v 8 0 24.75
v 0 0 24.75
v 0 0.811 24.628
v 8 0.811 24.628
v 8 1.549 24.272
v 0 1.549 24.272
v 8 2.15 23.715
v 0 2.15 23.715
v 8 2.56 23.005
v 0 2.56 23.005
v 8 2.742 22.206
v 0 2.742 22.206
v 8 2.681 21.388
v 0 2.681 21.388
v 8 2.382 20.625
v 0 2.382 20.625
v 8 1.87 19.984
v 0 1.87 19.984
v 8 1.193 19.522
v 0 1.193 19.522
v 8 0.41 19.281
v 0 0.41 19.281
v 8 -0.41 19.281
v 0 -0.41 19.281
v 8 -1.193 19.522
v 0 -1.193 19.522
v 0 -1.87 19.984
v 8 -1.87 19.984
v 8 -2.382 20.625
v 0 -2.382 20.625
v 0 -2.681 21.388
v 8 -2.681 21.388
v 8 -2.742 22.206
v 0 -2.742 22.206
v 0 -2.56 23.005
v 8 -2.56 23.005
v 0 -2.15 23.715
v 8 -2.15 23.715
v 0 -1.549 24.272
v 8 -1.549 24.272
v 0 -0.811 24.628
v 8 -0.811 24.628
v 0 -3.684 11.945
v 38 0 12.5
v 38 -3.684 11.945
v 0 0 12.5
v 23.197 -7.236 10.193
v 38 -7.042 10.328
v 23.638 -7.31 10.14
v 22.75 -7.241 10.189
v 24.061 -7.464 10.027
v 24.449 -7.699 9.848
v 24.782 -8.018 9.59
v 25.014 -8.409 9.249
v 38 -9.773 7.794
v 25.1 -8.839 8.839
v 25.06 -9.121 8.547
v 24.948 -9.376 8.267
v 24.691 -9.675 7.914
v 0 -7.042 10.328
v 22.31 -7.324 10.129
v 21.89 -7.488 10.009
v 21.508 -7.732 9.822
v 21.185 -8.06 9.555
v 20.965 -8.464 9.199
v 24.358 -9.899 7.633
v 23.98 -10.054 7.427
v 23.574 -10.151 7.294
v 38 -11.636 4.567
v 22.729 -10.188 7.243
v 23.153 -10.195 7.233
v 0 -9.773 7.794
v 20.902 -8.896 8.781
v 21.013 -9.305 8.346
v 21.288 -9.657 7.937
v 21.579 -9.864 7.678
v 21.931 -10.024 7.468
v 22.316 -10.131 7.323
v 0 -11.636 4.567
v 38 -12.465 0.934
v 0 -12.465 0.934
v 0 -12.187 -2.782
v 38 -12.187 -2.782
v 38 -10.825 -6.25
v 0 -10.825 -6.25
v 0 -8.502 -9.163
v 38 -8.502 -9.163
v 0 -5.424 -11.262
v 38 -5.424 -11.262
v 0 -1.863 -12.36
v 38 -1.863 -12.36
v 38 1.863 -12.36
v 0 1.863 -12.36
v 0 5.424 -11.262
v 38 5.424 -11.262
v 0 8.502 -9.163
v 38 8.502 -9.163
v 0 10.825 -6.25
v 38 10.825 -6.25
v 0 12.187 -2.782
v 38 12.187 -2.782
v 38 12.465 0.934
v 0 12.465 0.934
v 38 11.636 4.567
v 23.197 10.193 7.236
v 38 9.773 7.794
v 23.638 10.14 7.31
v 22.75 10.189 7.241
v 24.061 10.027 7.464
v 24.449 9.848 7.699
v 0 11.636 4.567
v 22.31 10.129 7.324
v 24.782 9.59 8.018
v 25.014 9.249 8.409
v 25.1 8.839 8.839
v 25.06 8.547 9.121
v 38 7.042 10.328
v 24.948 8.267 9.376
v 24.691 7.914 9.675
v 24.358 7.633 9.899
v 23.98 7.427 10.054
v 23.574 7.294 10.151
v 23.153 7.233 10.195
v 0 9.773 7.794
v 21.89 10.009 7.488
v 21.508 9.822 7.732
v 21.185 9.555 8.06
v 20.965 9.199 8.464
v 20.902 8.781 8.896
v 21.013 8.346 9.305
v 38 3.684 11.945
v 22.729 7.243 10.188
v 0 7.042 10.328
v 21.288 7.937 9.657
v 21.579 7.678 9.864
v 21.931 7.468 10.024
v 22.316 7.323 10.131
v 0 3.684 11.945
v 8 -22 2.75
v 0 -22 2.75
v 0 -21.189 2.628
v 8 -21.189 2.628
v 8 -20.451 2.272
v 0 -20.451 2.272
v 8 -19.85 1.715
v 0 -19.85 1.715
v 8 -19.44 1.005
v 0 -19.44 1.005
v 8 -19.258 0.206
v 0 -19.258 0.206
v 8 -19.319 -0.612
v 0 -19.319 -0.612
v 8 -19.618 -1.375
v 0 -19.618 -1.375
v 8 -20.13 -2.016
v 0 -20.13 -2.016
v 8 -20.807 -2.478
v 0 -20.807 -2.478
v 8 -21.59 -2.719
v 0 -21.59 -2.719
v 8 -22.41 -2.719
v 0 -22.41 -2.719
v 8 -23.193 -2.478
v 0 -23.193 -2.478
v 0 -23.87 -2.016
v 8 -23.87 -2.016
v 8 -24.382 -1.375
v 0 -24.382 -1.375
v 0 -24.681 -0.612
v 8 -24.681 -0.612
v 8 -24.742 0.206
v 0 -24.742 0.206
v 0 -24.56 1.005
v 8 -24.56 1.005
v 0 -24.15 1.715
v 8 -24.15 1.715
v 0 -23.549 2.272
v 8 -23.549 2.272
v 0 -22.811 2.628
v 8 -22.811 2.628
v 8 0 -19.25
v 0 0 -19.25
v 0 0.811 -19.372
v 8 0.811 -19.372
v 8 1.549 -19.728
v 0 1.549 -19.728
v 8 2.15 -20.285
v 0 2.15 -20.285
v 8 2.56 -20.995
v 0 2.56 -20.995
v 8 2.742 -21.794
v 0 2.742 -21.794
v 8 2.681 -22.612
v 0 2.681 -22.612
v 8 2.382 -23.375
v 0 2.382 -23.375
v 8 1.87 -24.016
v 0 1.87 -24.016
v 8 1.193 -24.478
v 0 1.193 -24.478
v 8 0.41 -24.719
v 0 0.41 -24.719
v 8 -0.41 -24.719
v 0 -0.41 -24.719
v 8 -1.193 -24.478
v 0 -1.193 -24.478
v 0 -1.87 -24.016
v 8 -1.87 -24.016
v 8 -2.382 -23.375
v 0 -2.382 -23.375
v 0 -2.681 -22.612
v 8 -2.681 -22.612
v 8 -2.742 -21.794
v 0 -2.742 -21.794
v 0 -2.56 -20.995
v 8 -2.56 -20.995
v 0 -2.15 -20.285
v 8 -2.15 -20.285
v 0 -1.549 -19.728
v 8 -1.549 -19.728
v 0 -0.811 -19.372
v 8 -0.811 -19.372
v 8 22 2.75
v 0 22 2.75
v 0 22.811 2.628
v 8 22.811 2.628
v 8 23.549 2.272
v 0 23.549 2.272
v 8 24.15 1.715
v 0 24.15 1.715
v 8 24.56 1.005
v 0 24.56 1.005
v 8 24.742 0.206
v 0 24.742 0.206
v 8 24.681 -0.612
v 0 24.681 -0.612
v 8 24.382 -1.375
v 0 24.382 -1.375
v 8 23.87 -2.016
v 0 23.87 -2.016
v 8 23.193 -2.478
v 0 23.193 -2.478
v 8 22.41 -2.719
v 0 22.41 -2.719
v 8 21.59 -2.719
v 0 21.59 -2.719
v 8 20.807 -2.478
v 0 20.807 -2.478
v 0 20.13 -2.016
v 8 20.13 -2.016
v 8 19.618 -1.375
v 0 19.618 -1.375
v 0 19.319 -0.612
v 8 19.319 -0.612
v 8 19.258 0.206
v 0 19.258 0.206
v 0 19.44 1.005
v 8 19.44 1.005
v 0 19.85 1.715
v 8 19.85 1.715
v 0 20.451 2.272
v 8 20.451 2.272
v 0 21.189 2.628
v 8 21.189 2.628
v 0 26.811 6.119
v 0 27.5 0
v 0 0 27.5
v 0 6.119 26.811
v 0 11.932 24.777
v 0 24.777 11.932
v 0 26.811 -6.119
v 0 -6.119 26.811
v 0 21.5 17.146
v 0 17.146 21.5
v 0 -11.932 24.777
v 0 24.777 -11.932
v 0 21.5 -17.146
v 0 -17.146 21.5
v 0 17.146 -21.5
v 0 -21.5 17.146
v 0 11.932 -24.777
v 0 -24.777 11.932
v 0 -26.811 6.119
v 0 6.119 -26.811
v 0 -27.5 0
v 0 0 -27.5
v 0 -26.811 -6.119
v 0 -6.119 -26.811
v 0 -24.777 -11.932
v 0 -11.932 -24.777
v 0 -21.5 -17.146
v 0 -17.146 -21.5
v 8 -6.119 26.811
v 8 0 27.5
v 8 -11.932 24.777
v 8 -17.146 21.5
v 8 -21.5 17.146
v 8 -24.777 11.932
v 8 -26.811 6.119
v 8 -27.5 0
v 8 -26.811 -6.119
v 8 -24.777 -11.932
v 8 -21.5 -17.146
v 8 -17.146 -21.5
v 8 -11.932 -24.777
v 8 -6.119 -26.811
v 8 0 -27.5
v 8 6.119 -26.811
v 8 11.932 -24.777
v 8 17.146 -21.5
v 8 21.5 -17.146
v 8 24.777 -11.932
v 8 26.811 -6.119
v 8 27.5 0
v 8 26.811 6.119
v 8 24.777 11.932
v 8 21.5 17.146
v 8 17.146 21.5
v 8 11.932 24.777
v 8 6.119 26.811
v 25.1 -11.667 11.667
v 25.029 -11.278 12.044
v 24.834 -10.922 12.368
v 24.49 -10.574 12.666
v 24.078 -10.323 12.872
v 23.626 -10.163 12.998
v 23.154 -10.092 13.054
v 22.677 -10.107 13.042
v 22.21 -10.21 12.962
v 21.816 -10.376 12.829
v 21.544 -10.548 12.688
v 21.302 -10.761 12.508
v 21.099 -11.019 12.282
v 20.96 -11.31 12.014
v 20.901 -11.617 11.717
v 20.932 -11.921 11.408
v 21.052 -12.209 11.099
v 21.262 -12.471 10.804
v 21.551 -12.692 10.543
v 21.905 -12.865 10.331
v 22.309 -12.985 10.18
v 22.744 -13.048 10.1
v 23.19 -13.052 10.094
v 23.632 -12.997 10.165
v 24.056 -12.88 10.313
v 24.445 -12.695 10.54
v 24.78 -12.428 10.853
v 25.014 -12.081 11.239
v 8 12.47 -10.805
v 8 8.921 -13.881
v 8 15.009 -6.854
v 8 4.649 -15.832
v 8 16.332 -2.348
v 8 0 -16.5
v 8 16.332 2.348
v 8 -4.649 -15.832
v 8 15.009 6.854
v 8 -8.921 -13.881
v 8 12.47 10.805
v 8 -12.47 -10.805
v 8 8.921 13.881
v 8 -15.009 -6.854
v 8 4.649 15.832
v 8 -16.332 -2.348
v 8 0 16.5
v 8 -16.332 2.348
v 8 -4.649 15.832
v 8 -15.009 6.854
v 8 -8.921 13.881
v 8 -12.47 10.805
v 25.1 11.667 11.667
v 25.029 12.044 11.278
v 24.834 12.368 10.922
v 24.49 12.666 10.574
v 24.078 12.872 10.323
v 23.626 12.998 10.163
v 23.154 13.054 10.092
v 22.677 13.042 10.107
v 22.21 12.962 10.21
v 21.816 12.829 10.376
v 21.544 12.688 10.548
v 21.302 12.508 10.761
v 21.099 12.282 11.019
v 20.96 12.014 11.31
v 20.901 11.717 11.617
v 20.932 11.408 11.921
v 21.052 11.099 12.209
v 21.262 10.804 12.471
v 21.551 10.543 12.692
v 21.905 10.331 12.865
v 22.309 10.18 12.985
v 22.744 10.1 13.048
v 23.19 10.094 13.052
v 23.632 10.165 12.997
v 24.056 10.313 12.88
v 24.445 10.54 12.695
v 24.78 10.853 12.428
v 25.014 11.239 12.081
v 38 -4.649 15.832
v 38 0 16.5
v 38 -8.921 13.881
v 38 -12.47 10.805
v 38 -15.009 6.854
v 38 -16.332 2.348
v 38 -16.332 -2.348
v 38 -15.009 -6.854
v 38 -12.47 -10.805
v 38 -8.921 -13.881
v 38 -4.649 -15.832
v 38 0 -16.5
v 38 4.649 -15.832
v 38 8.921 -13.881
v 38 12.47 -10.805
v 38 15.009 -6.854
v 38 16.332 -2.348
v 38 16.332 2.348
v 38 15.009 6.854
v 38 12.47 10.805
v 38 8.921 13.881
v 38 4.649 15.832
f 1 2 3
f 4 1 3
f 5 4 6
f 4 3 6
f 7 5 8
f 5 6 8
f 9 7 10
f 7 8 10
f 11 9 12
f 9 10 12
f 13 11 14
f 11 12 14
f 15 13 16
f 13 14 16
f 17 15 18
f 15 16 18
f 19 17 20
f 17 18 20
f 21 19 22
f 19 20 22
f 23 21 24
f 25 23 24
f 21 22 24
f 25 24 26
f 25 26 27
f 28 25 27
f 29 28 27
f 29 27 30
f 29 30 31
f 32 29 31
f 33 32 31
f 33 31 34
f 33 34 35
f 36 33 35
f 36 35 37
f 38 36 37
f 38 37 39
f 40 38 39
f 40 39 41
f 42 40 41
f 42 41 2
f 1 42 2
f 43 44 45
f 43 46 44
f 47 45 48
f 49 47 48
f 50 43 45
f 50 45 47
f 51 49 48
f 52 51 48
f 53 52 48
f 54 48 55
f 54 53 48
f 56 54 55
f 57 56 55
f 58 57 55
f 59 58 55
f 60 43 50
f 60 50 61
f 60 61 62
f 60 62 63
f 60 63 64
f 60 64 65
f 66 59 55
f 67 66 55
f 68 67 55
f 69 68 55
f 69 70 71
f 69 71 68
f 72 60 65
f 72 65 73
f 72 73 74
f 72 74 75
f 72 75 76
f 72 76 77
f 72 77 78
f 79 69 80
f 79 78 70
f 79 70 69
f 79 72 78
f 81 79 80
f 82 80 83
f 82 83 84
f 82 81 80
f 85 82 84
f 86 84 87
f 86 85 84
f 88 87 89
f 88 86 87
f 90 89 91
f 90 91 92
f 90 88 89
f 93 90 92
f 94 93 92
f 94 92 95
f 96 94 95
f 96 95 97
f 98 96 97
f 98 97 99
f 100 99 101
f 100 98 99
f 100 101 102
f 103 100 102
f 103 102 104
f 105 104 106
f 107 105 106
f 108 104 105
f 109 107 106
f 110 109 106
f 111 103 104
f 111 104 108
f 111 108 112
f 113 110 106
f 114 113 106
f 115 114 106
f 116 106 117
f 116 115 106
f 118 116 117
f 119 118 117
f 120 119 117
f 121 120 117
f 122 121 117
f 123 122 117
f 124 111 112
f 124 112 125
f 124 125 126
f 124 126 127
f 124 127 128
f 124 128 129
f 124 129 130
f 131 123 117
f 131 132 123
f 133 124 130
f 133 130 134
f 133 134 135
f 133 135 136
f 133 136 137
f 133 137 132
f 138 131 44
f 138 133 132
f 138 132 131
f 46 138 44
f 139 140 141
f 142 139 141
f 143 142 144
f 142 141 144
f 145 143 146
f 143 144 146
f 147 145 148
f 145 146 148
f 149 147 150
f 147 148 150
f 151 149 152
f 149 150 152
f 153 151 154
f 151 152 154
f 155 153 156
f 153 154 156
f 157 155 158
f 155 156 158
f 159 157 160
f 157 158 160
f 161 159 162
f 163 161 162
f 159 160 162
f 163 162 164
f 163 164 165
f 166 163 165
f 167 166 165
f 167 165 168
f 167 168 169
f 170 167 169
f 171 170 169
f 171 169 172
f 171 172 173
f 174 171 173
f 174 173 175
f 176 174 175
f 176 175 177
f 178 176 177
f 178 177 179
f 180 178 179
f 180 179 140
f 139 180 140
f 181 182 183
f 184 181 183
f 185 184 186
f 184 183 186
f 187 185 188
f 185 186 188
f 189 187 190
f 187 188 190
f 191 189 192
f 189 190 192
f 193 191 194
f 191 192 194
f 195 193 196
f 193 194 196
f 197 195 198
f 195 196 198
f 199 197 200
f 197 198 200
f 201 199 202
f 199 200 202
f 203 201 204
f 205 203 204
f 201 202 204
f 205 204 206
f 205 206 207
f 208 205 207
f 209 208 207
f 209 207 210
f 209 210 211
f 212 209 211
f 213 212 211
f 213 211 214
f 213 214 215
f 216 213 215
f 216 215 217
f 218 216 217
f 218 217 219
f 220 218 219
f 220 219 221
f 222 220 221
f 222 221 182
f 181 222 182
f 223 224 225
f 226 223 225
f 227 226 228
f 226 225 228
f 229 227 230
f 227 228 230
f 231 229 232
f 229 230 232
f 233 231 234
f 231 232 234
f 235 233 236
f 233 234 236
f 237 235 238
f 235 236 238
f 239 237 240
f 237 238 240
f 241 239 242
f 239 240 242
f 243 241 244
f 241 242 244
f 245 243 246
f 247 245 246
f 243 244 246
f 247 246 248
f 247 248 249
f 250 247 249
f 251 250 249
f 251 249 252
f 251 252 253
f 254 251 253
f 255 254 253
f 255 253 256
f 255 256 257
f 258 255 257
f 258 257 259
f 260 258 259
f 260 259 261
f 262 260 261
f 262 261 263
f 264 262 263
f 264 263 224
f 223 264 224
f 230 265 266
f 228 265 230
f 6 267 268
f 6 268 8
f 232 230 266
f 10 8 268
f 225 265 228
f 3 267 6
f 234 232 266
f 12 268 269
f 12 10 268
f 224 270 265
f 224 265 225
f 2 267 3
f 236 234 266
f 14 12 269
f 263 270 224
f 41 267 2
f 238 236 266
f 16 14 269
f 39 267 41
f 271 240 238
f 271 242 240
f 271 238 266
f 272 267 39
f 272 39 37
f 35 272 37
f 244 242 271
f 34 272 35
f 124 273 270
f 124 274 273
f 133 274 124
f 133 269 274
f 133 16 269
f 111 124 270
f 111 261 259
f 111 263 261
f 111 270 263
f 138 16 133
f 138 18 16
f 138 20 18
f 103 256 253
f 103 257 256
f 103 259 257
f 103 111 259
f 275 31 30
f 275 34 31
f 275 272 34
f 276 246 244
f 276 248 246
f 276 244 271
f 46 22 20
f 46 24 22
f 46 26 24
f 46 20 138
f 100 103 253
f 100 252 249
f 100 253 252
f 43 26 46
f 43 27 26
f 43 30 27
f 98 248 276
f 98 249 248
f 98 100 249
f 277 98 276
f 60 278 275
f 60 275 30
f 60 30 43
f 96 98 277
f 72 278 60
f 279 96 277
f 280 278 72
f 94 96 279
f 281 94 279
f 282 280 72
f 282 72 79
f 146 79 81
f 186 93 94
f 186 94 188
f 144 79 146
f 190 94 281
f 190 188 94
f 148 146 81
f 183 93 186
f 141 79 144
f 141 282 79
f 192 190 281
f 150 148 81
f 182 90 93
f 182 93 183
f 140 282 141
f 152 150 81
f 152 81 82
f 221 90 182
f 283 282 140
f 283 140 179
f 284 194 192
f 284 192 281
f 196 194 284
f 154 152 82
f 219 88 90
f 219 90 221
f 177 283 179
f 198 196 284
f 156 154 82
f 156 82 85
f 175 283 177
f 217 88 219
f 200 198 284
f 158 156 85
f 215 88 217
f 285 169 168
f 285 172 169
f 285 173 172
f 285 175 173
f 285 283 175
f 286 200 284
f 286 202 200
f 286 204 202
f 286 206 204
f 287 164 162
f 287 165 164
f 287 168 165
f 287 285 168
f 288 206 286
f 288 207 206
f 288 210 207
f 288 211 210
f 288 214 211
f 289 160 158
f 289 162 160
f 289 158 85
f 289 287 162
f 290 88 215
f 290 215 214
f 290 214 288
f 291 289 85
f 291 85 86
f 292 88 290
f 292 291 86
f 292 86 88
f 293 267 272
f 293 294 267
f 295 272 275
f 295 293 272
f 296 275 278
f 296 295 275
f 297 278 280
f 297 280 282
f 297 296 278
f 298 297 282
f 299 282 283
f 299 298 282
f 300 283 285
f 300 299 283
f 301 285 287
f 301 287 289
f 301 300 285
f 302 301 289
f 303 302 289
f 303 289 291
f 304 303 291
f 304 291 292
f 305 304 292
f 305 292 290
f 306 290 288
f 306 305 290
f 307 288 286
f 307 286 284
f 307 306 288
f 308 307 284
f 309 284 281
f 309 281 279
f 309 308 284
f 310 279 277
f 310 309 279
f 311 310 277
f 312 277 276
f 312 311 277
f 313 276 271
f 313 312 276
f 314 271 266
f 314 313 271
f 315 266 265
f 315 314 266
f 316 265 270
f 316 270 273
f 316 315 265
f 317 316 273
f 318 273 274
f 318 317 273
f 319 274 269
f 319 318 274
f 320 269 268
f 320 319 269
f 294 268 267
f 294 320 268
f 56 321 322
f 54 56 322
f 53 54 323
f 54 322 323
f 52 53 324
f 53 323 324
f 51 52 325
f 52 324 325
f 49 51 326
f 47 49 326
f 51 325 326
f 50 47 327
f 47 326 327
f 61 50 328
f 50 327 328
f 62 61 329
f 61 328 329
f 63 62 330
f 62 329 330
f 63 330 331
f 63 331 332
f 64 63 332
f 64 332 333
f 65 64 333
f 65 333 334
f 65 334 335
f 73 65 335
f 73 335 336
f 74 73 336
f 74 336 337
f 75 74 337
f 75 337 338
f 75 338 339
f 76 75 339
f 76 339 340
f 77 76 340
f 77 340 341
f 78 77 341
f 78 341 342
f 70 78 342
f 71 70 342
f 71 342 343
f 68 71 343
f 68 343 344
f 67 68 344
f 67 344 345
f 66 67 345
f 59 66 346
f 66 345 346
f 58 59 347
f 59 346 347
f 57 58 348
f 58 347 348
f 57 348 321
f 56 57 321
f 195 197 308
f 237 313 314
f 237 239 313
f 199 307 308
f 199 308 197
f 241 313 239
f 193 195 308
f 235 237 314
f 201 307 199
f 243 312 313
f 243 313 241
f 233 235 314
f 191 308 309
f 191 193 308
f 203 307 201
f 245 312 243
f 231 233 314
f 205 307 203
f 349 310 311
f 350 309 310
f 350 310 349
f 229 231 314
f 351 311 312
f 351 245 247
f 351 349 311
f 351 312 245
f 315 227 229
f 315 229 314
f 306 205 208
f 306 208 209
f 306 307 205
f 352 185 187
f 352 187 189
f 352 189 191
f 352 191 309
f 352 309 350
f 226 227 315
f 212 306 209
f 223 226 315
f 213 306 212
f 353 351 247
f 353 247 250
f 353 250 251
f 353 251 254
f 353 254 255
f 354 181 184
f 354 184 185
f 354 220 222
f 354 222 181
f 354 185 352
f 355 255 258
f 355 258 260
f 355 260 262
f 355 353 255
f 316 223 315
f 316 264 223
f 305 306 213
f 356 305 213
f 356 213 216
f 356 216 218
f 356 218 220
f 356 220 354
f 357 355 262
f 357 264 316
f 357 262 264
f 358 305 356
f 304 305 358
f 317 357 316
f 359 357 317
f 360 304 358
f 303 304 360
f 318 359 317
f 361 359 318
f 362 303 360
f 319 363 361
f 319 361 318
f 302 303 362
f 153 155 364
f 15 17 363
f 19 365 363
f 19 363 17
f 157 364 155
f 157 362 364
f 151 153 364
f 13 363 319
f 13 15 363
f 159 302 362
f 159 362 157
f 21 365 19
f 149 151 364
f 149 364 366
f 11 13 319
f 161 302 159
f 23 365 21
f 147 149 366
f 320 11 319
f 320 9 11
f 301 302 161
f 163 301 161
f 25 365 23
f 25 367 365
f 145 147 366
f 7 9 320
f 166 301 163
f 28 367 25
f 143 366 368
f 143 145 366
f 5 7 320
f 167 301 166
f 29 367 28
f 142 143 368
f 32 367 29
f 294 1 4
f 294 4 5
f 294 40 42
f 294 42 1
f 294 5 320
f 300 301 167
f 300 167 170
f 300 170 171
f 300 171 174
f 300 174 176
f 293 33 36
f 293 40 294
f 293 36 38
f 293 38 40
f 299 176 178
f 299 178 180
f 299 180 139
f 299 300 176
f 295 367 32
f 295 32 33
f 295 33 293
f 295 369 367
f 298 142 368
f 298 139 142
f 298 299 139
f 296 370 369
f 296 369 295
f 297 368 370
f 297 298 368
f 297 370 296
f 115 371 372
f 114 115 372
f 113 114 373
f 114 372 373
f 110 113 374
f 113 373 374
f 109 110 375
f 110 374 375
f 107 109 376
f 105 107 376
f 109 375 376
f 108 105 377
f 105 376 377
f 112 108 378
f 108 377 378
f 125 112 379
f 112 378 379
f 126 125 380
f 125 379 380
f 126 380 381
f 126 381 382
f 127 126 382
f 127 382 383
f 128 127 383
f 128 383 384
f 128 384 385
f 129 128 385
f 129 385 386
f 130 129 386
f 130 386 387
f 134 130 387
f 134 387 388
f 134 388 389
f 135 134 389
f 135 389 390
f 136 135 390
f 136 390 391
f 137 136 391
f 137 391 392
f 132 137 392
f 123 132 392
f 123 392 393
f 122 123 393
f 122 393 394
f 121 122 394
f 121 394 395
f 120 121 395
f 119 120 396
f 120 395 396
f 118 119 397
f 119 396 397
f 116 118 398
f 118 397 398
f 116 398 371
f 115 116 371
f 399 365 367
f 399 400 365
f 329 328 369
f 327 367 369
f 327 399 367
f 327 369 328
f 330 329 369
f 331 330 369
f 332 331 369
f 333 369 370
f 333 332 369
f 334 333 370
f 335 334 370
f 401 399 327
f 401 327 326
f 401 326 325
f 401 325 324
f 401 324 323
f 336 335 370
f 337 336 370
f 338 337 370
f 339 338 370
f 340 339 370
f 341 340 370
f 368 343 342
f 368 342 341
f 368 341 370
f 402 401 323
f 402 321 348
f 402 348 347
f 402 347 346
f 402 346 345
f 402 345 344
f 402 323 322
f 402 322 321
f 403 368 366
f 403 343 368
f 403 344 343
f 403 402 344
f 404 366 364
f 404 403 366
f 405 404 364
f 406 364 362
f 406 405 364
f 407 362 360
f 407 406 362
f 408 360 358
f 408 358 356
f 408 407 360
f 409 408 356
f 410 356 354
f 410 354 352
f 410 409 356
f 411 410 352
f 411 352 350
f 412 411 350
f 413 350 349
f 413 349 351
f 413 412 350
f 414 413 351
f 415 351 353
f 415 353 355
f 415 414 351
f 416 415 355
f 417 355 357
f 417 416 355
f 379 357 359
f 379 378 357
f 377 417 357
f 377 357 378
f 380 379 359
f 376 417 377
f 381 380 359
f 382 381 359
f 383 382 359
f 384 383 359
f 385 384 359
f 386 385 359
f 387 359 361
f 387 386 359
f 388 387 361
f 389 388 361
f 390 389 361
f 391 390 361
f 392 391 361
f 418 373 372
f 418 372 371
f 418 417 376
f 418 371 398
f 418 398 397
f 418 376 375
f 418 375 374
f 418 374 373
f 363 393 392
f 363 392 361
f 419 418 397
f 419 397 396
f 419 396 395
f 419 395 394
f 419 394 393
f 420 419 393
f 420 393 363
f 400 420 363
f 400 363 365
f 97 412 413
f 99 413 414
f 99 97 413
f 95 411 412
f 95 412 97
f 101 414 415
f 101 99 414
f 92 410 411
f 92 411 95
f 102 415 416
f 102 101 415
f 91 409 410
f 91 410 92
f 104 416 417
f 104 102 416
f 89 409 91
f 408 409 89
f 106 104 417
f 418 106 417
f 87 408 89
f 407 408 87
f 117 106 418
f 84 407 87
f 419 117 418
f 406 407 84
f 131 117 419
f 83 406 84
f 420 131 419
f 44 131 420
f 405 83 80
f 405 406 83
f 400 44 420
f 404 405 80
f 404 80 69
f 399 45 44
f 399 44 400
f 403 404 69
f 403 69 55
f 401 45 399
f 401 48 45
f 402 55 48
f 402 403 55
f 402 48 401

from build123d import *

# Parameters (mm, degrees)
TAPPED_HOLE1_REACH  = 103.897
TAPPED_HOLE1_BORE_R = 2.1
CIRPATTERN1_COUNT   = 2
CIRPATTERN1_ANGLE   = 90
DIAMETER_HOLE1_D    = 5.5
DIAMETER_HOLE2_D    = 5.5


with BuildPart() as part:
    # Sketch1 → Revolve1 (revolve)
    with BuildSketch(Plane.XY, mode=Mode.PRIVATE) as revolve1_sk:
        Polygon((0, 12.5), (0, 27.5), (8, 27.5), (8, 16.5), (38, 16.5), (38, 12.5), align=None)
    revolve(revolve1_sk.sketch.rotate(Axis((0, 0, 0), (1, 0, 0)), 90), axis=Axis((0, 0, 0), (1, 0, 0)))

    # Tapped Hole1 bore → Tapped Hole1 (cut, up to next)
    with BuildSketch(Plane(origin=(84.688297546, 3.217458949, 20.11706483), x_dir=(1, 0, 0), z_dir=(0, 0.7071067811865488, 0.7071067811865464)), mode=Mode.PRIVATE) as tapped_hole1_sk1:
        with Locations((-61.688297546, 11.949825918)):
            Circle(TAPPED_HOLE1_BORE_R)
    tapped_hole1_tool1 = extrude(tapped_hole1_sk1.sketch, amount=-TAPPED_HOLE1_REACH, mode=Mode.PRIVATE) & part.part
    tapped_hole1 = tapped_hole1_tool1.solids().sort_by_distance((23, 11.667262, 11.667262))[0]
    add(tapped_hole1, mode=Mode.SUBTRACT)

    # CirPattern1: Tapped Hole1 ×2 about axis
    cirpattern1_axis = Axis((0, 0, 0), (1, 0, 0))
    for i in range(1, CIRPATTERN1_COUNT):
        add(tapped_hole1.rotate(cirpattern1_axis, i * CIRPATTERN1_ANGLE / (CIRPATTERN1_COUNT - 1)), mode=Mode.SUBTRACT)

    # Diameter Hole1 (through all)
    with Locations(Plane(origin=(8, 0, 0), x_dir=(0, 0, -1), z_dir=(1, 0, 0))):
        with Locations((0, 22), (0, -22)):
            Hole(DIAMETER_HOLE1_D / 2)

    # Diameter Hole2 (through all)
    with Locations(Plane(origin=(8, 0, 0), x_dir=(0, 0, -1), z_dir=(1, 0, 0))):
        with Locations((-22, 0), (22, 0)):
            Hole(DIAMETER_HOLE2_D / 2)


solid = part.part
